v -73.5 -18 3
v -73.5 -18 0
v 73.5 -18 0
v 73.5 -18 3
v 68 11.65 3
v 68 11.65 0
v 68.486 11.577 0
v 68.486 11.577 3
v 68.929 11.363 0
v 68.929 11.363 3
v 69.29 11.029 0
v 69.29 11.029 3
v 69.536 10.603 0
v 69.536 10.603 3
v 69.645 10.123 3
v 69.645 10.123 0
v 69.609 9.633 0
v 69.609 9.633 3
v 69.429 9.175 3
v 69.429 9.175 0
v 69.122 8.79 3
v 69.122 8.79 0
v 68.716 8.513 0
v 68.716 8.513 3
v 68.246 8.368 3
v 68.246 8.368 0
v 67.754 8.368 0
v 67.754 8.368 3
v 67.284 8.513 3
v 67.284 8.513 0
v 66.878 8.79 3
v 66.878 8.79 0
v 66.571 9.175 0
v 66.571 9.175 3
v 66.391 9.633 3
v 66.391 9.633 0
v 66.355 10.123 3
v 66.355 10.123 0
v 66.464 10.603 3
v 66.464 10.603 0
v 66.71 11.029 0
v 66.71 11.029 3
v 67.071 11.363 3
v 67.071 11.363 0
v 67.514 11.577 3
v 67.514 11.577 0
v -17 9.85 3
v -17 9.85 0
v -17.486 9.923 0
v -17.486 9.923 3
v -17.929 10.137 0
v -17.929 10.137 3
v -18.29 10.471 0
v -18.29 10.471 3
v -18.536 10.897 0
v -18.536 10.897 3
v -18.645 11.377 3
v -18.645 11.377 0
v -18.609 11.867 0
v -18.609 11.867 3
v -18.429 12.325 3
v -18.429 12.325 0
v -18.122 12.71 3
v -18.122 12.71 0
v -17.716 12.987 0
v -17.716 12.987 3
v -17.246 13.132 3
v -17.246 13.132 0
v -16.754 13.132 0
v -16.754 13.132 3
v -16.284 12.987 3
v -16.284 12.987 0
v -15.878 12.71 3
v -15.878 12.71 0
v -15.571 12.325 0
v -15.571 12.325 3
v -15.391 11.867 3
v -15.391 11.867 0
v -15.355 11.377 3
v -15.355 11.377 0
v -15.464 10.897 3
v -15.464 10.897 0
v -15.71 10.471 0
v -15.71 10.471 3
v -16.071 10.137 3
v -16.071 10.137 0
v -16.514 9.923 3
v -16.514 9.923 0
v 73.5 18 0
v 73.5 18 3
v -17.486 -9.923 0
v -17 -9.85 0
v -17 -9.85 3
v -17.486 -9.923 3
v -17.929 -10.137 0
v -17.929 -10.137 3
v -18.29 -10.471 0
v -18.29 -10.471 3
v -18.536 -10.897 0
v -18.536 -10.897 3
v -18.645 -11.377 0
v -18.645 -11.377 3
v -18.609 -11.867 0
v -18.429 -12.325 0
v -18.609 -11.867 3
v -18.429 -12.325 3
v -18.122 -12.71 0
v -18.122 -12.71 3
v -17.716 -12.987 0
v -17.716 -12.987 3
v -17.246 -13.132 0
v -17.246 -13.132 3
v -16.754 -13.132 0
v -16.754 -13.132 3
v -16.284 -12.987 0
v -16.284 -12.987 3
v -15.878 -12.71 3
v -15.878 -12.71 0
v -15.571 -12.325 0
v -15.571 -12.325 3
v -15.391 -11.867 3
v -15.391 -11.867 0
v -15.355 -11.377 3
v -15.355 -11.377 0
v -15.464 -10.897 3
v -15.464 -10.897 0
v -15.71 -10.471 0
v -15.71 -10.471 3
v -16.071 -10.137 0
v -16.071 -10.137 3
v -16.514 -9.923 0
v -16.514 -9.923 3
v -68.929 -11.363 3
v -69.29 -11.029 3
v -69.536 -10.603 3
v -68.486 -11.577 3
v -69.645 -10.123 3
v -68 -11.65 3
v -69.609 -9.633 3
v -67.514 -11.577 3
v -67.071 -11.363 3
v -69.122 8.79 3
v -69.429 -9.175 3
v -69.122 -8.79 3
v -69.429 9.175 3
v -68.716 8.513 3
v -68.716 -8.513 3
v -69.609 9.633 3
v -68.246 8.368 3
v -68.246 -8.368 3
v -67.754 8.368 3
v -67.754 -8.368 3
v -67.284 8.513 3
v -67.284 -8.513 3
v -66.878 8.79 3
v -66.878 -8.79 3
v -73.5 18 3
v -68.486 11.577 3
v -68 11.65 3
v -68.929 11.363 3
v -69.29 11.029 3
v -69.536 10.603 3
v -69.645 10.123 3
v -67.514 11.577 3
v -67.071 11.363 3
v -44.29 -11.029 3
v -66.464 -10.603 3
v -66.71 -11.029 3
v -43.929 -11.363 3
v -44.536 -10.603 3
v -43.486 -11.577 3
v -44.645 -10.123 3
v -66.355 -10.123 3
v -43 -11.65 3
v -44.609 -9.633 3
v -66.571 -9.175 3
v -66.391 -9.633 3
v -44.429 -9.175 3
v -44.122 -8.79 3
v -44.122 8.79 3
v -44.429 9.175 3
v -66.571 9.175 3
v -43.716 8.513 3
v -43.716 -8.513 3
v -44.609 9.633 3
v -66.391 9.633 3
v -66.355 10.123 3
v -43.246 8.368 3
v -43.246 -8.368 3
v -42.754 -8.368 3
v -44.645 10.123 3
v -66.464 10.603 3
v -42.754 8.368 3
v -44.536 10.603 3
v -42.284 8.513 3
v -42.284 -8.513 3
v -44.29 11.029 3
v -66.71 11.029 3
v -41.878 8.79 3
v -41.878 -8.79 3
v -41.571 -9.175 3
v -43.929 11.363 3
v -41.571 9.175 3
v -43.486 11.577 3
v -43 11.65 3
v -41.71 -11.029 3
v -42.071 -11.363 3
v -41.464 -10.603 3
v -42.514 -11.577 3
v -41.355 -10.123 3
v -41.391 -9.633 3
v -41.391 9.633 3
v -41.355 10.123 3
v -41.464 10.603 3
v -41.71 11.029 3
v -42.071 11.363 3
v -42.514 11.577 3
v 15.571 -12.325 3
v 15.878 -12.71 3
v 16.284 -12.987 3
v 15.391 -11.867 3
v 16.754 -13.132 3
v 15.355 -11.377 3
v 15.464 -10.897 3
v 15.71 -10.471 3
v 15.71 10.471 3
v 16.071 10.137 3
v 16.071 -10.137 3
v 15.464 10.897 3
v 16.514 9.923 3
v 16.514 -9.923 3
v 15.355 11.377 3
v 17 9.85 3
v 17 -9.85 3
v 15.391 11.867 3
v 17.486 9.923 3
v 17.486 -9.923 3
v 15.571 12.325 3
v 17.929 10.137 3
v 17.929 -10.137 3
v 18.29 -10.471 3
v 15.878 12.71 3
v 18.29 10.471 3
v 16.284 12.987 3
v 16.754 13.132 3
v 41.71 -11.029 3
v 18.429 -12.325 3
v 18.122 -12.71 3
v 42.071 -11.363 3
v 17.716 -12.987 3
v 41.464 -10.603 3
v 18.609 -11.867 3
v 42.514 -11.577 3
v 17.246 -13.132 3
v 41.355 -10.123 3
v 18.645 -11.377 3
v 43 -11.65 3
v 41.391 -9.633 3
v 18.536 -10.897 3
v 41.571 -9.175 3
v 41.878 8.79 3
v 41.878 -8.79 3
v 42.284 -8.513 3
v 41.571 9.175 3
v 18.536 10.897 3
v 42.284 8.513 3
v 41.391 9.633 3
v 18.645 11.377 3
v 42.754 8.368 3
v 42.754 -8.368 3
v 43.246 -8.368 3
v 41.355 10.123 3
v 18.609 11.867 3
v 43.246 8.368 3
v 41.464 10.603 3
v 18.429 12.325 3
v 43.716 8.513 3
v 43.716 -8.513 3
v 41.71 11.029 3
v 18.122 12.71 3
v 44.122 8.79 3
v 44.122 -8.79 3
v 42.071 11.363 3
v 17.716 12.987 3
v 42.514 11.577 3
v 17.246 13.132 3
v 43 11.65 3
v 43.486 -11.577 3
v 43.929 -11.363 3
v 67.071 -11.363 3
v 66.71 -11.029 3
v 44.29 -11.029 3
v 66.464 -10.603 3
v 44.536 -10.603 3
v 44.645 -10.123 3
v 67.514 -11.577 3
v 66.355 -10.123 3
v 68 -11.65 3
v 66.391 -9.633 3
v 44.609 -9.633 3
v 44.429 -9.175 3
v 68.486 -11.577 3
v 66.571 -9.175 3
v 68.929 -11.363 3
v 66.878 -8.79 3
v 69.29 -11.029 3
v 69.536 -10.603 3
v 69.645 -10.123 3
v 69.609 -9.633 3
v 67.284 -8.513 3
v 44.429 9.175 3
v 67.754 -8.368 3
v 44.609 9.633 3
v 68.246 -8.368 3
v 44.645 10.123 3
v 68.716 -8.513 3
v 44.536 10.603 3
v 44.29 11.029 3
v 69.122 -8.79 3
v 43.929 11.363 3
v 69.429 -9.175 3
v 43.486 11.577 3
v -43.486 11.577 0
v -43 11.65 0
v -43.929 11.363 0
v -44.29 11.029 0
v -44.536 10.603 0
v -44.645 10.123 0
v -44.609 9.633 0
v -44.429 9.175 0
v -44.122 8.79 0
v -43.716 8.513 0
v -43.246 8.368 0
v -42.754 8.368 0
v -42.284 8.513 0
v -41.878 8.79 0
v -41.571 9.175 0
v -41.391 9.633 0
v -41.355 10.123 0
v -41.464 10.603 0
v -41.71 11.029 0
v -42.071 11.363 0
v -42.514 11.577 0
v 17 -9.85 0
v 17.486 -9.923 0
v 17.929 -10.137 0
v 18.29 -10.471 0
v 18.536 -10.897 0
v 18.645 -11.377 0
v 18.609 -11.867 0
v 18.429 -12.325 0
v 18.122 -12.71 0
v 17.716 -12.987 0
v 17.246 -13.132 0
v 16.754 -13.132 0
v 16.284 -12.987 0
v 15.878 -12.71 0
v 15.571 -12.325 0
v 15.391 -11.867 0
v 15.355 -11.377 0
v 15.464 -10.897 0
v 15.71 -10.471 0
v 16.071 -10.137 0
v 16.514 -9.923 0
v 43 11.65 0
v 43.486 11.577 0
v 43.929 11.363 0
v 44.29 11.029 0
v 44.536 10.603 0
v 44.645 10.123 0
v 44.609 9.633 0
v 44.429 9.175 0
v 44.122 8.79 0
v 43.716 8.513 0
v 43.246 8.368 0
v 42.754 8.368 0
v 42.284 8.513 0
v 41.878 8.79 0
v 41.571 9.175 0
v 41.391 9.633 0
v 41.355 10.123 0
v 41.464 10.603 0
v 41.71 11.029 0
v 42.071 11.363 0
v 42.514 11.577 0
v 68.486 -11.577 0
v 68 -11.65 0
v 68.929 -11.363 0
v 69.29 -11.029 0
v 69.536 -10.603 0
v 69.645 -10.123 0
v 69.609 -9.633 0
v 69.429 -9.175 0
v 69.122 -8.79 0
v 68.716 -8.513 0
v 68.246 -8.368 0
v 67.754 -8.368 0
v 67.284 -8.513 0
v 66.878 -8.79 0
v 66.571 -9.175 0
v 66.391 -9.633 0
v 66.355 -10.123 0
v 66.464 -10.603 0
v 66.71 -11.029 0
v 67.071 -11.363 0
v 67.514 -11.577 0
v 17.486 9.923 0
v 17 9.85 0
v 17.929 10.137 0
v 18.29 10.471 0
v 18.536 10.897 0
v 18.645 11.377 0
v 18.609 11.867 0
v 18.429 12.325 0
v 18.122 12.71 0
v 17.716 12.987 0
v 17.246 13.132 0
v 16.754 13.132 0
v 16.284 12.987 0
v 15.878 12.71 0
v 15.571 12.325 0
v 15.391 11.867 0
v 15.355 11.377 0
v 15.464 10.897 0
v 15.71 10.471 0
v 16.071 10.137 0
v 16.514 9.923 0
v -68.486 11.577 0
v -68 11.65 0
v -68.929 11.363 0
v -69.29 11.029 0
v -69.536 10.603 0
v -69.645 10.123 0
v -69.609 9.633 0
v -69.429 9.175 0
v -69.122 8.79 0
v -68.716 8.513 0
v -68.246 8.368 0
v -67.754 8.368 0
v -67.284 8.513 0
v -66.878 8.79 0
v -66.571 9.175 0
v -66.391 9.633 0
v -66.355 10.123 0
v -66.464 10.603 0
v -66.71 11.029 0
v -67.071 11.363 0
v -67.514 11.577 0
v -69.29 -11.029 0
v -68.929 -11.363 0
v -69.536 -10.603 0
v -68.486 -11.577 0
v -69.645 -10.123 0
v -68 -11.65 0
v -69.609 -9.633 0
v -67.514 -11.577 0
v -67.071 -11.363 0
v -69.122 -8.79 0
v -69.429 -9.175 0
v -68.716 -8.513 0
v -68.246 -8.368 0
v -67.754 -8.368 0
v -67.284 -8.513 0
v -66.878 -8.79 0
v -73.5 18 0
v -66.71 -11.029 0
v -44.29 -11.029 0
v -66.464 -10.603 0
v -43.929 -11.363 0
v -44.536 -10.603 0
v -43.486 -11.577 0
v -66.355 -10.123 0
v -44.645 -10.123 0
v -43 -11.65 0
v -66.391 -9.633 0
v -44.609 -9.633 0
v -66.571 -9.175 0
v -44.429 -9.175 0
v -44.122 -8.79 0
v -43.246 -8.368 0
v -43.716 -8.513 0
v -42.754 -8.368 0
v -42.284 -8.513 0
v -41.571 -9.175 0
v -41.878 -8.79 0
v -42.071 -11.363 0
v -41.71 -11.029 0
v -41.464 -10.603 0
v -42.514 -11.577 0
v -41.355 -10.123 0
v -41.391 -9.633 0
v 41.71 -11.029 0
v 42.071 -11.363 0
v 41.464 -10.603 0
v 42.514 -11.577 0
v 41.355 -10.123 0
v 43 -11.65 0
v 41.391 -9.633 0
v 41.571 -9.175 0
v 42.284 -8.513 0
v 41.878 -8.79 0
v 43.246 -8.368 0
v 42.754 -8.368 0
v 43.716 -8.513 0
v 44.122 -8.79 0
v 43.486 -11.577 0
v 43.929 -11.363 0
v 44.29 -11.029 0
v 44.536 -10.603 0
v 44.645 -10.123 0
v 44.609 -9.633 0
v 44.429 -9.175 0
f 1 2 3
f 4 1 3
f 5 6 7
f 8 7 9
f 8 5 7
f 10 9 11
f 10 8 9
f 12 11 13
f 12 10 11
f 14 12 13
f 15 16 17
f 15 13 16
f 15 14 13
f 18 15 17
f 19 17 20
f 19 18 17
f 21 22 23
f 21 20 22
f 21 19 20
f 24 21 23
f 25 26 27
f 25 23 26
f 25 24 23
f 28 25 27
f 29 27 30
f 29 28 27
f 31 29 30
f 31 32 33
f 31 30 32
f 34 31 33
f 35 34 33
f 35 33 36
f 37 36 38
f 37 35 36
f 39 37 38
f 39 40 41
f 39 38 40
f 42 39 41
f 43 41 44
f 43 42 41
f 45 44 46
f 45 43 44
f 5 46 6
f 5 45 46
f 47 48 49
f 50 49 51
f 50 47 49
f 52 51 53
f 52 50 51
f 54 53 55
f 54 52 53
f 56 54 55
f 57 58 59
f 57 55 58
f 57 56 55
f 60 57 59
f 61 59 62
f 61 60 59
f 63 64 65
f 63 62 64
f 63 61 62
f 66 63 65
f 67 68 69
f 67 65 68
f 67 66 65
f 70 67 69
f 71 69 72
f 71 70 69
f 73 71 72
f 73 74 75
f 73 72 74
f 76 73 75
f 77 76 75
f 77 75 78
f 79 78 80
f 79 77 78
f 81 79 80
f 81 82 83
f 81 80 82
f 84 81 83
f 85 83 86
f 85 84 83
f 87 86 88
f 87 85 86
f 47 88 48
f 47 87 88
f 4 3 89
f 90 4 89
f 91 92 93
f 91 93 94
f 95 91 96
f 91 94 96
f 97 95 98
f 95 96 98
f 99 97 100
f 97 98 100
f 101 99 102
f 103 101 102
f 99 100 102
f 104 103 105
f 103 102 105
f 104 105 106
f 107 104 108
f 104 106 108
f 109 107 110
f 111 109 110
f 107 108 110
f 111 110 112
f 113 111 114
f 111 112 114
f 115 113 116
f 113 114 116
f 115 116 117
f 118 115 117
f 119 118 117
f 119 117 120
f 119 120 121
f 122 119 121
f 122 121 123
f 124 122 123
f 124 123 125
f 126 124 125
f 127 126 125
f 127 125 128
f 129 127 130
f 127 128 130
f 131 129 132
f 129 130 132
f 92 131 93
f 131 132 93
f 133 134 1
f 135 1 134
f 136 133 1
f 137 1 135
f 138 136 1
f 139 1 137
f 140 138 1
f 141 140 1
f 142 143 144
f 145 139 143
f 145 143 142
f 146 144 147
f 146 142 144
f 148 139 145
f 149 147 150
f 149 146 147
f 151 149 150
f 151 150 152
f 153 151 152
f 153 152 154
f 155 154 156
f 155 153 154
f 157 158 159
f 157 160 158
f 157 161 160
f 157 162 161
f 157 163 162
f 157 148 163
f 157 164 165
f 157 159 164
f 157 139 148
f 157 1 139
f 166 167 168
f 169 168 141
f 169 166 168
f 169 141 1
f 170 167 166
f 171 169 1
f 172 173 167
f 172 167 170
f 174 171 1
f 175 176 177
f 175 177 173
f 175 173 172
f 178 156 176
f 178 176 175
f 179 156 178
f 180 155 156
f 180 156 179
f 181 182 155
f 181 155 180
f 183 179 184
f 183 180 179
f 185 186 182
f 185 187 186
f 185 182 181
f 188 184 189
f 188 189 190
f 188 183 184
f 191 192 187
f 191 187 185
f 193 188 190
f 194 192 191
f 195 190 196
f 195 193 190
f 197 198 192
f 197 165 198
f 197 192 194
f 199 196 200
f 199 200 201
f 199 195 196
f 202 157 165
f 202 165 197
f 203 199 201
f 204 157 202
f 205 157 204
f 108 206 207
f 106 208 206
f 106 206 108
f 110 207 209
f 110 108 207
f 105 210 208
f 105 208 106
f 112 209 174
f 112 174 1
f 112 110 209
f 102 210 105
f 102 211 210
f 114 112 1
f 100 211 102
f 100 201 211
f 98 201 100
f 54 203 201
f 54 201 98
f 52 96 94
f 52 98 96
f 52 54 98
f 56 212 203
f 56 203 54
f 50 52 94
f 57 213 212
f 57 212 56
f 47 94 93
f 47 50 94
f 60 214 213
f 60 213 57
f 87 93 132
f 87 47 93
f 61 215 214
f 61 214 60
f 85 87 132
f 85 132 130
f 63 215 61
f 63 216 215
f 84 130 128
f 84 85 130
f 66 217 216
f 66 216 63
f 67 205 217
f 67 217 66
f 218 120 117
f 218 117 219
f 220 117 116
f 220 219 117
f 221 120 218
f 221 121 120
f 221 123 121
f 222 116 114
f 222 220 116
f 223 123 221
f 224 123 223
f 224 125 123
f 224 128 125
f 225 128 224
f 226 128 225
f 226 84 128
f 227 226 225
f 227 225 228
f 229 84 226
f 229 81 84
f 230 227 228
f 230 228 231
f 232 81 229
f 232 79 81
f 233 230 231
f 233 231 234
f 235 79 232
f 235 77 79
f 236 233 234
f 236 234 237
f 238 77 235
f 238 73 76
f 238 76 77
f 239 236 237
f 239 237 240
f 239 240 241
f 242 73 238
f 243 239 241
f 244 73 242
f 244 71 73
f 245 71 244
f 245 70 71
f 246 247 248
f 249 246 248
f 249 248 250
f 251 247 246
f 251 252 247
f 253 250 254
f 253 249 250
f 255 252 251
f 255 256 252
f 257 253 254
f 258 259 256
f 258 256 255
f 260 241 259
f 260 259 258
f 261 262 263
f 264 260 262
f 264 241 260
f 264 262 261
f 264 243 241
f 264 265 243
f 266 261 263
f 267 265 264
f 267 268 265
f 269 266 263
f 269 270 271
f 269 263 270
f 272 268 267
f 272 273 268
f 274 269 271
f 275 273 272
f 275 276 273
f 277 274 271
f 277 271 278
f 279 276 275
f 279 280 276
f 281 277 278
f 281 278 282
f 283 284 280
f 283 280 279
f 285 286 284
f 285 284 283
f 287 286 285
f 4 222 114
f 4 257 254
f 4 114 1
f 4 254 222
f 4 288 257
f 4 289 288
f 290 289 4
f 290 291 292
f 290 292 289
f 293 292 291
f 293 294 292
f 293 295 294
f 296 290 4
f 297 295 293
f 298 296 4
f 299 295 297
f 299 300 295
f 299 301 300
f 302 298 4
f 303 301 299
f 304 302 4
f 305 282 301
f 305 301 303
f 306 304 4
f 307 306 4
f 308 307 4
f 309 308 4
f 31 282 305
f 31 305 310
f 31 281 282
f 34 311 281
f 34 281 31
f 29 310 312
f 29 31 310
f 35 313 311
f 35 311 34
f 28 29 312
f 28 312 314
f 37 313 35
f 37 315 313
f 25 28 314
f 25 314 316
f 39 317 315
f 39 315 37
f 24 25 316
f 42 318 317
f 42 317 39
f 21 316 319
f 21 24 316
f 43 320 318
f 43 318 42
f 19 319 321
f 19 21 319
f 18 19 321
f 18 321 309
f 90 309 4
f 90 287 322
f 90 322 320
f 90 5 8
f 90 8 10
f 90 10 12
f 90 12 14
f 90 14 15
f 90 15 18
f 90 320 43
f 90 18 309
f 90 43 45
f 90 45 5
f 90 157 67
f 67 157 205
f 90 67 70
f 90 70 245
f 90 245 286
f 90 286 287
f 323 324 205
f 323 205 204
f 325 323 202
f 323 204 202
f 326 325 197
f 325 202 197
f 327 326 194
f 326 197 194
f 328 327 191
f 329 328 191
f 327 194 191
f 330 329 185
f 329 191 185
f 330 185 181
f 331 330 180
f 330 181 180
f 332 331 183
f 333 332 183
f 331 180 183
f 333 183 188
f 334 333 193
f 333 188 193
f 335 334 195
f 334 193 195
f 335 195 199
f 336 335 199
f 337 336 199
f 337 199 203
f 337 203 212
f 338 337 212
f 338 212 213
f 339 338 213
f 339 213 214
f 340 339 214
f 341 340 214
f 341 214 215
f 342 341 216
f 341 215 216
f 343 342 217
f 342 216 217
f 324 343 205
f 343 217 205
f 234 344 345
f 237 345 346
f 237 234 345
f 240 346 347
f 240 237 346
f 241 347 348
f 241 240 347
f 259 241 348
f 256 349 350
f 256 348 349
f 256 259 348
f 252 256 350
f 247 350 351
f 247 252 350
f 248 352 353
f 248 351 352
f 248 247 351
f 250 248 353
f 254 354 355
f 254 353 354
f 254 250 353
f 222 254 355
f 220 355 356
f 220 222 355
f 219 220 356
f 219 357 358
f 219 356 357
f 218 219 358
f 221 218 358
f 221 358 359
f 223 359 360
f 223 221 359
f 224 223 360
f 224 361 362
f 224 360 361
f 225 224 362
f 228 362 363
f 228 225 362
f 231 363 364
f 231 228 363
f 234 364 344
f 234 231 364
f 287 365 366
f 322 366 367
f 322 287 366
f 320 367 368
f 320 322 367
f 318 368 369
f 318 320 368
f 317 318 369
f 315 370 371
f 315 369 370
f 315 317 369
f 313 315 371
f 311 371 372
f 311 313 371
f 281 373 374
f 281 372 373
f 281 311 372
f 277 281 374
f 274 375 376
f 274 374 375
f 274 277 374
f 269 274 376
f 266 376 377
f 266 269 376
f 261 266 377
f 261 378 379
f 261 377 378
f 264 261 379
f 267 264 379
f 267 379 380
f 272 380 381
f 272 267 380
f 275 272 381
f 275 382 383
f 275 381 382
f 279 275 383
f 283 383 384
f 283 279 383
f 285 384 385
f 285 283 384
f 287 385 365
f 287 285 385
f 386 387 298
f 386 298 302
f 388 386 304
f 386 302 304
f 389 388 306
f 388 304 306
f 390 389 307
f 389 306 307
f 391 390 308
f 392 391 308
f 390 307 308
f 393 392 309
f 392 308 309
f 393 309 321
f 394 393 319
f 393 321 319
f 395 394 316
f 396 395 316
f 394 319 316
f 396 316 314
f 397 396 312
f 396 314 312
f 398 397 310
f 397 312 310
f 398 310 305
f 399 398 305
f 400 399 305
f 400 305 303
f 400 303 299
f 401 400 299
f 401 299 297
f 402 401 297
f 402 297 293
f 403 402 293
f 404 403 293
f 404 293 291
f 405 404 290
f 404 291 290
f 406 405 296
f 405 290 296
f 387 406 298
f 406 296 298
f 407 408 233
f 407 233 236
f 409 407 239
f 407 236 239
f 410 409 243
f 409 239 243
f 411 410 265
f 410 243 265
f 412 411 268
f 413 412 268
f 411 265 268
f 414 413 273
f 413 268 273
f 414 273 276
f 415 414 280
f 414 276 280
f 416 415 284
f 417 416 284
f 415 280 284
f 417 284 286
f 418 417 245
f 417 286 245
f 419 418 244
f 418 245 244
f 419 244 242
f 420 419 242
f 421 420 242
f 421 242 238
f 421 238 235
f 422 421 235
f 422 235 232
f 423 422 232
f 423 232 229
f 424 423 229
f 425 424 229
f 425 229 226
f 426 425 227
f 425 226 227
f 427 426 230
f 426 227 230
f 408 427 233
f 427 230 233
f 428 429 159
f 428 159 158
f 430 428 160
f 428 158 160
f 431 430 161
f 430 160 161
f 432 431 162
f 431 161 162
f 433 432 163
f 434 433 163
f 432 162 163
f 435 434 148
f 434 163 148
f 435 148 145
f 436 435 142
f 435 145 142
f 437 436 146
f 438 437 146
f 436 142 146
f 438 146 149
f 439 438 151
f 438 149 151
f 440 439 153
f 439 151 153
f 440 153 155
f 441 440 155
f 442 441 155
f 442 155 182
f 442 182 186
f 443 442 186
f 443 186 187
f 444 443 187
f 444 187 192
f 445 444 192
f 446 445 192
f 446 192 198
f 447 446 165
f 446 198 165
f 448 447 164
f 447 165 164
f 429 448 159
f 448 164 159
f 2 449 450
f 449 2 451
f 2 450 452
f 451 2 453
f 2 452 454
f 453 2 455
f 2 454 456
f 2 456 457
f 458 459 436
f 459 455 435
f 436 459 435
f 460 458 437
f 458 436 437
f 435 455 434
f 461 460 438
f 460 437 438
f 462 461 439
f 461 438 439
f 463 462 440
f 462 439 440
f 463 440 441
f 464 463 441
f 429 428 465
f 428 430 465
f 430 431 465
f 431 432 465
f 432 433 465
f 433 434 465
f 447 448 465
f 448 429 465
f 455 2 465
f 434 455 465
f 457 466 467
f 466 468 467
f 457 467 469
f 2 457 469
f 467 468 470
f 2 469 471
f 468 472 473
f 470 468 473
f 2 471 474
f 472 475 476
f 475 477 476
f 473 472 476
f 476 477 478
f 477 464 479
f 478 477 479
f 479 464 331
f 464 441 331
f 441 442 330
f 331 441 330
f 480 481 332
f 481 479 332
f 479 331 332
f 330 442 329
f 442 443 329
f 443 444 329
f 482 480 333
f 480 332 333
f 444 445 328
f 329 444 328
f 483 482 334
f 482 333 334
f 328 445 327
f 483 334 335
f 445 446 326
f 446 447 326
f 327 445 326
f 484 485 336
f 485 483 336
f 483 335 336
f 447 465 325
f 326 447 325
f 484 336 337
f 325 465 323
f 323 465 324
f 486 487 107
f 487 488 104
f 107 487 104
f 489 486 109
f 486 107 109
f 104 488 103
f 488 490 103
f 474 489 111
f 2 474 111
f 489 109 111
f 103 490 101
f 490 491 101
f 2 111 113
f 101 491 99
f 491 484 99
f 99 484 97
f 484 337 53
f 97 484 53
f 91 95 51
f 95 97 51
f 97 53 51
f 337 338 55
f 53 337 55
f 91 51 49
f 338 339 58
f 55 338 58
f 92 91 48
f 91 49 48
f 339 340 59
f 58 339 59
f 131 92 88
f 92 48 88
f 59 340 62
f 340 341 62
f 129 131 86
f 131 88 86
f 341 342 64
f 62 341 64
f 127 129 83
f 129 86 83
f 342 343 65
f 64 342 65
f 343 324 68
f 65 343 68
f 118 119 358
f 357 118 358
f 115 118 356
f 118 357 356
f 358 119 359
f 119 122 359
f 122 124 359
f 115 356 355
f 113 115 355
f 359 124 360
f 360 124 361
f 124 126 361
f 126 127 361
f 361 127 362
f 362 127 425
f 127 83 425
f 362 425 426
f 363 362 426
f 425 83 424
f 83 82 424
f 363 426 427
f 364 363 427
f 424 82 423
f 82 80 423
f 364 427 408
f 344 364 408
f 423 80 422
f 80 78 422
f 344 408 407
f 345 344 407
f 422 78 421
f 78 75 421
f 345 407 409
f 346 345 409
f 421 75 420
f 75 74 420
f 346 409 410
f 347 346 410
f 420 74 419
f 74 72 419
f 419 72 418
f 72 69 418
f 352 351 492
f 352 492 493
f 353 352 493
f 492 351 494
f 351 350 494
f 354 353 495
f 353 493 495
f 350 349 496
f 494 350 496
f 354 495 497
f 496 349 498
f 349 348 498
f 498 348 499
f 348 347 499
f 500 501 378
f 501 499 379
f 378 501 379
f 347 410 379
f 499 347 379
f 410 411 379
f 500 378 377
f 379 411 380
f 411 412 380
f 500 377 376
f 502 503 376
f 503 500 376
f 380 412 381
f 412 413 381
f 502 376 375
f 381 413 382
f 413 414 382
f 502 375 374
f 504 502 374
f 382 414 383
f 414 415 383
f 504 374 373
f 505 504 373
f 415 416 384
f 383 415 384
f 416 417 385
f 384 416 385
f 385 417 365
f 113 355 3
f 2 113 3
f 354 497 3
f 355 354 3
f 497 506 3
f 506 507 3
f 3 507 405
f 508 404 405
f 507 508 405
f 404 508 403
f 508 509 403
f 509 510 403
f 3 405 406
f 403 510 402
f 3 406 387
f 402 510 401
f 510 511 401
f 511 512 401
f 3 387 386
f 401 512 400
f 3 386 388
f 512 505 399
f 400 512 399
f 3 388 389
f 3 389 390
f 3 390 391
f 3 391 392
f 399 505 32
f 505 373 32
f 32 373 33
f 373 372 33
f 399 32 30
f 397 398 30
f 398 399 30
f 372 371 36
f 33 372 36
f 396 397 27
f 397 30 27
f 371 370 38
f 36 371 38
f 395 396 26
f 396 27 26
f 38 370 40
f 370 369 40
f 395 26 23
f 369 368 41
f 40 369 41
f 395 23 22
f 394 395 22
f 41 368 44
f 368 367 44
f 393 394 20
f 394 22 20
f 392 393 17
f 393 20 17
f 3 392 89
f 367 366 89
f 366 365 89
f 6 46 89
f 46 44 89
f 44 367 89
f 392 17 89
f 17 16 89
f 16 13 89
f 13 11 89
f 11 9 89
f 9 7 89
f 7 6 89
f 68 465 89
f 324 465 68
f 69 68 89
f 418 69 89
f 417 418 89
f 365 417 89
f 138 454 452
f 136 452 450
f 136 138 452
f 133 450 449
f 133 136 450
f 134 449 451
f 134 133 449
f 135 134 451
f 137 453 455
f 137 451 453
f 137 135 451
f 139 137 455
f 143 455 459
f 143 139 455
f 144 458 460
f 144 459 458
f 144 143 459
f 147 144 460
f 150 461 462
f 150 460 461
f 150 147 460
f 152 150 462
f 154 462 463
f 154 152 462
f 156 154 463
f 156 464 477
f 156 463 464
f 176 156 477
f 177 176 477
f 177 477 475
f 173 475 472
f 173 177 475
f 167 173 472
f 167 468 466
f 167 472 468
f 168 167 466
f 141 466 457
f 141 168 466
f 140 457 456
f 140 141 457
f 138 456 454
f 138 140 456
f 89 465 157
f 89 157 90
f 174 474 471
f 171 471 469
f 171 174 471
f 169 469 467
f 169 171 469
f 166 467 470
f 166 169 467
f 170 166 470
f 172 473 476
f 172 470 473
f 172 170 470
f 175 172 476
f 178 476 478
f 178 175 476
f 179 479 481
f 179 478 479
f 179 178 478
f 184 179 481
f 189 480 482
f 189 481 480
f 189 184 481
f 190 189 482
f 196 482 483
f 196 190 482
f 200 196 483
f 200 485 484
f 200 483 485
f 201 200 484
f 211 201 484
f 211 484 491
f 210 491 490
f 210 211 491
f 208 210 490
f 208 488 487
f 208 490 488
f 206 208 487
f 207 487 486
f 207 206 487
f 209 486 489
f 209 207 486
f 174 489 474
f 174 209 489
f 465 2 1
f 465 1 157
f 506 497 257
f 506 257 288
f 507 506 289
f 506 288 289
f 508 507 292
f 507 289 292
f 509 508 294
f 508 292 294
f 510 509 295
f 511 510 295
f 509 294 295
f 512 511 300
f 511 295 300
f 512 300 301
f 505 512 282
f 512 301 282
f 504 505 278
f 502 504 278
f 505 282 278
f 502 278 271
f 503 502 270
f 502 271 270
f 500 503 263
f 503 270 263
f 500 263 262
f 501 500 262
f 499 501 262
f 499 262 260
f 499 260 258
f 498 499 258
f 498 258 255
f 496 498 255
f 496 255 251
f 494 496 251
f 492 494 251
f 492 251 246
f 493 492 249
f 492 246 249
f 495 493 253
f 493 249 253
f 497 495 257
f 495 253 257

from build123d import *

# Parameters (mm, degrees)
SKETCH_1_W                  = 147
SKETCH_1_H                  = 36
EXTRUDE_1_DEPTH             = 3
HOLE_WIZARD_M4_2_AT_2_COUNT = 2
HOLE_WIZARD_M4_2_AT_2_PITCH = 25


with BuildPart() as part:
    # 草图1 → 凸台-拉伸1 (new body)
    with BuildSketch(Plane.XY):
        Rectangle(SKETCH_1_W, SKETCH_1_H)
    extrude(amount=EXTRUDE_1_DEPTH)

    # 草图3 → M4 螺纹孔的螺纹孔钻头1 (revolve, cut)
    with BuildSketch(Plane(origin=(-17, 11.5, 3), x_dir=(0, -1, 0), z_dir=(1, 0, 0))):
        Polygon((0, 0), (0, 10.991420021), (1.65, 10), (1.65, 0), align=None)
    hole_wizard_m4_1 = revolve(axis=Axis((-17, 11.5, 9.35), (0, 0, -1)), mode=Mode.SUBTRACT)

    # 镜向1: M4 螺纹孔的螺纹孔钻头1 across plane
    add(hole_wizard_m4_1.mirror(Plane.ZX), mode=Mode.SUBTRACT)

    # 镜向2: M4 螺纹孔的螺纹孔钻头1 across plane
    add(hole_wizard_m4_1.mirror(Plane(origin=(0, 0, 0), x_dir=(0, 0, 1), z_dir=(1, 0, 0))), mode=Mode.SUBTRACT)

    # 镜向2 copy 1 sketch → 镜向2 copy 1 (revolve, cut)
    with BuildSketch(Plane(origin=(17, -11.5, 3), x_dir=(0, 1, 0), z_dir=(-1, 0, 0))):
        Polygon((0, 0), (0, 10.991420021), (1.65, 10), (1.65, 0), align=None)
    revolve(axis=Axis((17, -11.5, 9.35), (0, 0, -1)), mode=Mode.SUBTRACT)

    # 草图5 → M4 螺纹孔的螺纹孔钻头2 (revolve, cut)
    with BuildSketch(Plane(origin=(-68, -10, 3), x_dir=(0, -1, 0), z_dir=(1, 0, 0))):
        Polygon((0, 0), (0, 10.991420021), (1.65, 10), (1.65, 0), align=None)
    hole_wizard_m4_2 = revolve(axis=Axis((-68, -10, 9.35), (0, 0, -1)), mode=Mode.SUBTRACT)

    # M4 螺纹孔的螺纹孔钻头2 at 2: M4 螺纹孔的螺纹孔钻头2 ×2
    with Locations(*[(i * HOLE_WIZARD_M4_2_AT_2_PITCH, 0, 0) for i in range(1, HOLE_WIZARD_M4_2_AT_2_COUNT)]):
        add(hole_wizard_m4_2, mode=Mode.SUBTRACT)

    # 镜向3: M4 螺纹孔的螺纹孔钻头2 across plane
    add(hole_wizard_m4_2.mirror(Plane.ZX), mode=Mode.SUBTRACT)

    # 镜向3 copy 1 sketch → 镜向3 copy 1 (revolve, cut)
    with BuildSketch(Plane(origin=(-43, 10, 3), x_dir=(0, 1, 0), z_dir=(1, 0, 0))):
        Polygon((0, 0), (0, -10.991420021), (1.65, -10), (1.65, 0), align=None)
    revolve(axis=Axis((-43, 10, 9.35), (0, 0, 1)), mode=Mode.SUBTRACT)

    # 镜向4: M4 螺纹孔的螺纹孔钻头2 across plane
    add(hole_wizard_m4_2.mirror(Plane(origin=(0, 0, 0), x_dir=(0, 0, 1), z_dir=(1, 0, 0))), mode=Mode.SUBTRACT)

    # 镜向4 copy 1 sketch → 镜向4 copy 1 (revolve, cut)
    with BuildSketch(Plane(origin=(43, -10, 3), x_dir=(0, -1, 0), z_dir=(-1, 0, 0))):
        Polygon((0, 0), (0, -10.991420021), (1.65, -10), (1.65, 0), align=None)
    revolve(axis=Axis((43, -10, 9.35), (0, 0, 1)), mode=Mode.SUBTRACT)

    # 镜向4 copy 2 sketch → 镜向4 copy 2 (revolve, cut)
    with BuildSketch(Plane(origin=(68, 10, 3), x_dir=(0, 1, 0), z_dir=(-1, 0, 0))):
        Polygon((0, 0), (0, 10.991420021), (1.65, 10), (1.65, 0), align=None)
    revolve(axis=Axis((68, 10, 9.35), (0, 0, -1)), mode=Mode.SUBTRACT)

    # 镜向4 copy 3 sketch → 镜向4 copy 3 (revolve, cut)
    with BuildSketch(Plane(origin=(43, 10, 3), x_dir=(0, 1, 0), z_dir=(-1, 0, 0))):
        Polygon((0, 0), (0, 10.991420021), (1.65, 10), (1.65, 0), align=None)
    revolve(axis=Axis((43, 10, 9.35), (0, 0, -1)), mode=Mode.SUBTRACT)


solid = part.part
